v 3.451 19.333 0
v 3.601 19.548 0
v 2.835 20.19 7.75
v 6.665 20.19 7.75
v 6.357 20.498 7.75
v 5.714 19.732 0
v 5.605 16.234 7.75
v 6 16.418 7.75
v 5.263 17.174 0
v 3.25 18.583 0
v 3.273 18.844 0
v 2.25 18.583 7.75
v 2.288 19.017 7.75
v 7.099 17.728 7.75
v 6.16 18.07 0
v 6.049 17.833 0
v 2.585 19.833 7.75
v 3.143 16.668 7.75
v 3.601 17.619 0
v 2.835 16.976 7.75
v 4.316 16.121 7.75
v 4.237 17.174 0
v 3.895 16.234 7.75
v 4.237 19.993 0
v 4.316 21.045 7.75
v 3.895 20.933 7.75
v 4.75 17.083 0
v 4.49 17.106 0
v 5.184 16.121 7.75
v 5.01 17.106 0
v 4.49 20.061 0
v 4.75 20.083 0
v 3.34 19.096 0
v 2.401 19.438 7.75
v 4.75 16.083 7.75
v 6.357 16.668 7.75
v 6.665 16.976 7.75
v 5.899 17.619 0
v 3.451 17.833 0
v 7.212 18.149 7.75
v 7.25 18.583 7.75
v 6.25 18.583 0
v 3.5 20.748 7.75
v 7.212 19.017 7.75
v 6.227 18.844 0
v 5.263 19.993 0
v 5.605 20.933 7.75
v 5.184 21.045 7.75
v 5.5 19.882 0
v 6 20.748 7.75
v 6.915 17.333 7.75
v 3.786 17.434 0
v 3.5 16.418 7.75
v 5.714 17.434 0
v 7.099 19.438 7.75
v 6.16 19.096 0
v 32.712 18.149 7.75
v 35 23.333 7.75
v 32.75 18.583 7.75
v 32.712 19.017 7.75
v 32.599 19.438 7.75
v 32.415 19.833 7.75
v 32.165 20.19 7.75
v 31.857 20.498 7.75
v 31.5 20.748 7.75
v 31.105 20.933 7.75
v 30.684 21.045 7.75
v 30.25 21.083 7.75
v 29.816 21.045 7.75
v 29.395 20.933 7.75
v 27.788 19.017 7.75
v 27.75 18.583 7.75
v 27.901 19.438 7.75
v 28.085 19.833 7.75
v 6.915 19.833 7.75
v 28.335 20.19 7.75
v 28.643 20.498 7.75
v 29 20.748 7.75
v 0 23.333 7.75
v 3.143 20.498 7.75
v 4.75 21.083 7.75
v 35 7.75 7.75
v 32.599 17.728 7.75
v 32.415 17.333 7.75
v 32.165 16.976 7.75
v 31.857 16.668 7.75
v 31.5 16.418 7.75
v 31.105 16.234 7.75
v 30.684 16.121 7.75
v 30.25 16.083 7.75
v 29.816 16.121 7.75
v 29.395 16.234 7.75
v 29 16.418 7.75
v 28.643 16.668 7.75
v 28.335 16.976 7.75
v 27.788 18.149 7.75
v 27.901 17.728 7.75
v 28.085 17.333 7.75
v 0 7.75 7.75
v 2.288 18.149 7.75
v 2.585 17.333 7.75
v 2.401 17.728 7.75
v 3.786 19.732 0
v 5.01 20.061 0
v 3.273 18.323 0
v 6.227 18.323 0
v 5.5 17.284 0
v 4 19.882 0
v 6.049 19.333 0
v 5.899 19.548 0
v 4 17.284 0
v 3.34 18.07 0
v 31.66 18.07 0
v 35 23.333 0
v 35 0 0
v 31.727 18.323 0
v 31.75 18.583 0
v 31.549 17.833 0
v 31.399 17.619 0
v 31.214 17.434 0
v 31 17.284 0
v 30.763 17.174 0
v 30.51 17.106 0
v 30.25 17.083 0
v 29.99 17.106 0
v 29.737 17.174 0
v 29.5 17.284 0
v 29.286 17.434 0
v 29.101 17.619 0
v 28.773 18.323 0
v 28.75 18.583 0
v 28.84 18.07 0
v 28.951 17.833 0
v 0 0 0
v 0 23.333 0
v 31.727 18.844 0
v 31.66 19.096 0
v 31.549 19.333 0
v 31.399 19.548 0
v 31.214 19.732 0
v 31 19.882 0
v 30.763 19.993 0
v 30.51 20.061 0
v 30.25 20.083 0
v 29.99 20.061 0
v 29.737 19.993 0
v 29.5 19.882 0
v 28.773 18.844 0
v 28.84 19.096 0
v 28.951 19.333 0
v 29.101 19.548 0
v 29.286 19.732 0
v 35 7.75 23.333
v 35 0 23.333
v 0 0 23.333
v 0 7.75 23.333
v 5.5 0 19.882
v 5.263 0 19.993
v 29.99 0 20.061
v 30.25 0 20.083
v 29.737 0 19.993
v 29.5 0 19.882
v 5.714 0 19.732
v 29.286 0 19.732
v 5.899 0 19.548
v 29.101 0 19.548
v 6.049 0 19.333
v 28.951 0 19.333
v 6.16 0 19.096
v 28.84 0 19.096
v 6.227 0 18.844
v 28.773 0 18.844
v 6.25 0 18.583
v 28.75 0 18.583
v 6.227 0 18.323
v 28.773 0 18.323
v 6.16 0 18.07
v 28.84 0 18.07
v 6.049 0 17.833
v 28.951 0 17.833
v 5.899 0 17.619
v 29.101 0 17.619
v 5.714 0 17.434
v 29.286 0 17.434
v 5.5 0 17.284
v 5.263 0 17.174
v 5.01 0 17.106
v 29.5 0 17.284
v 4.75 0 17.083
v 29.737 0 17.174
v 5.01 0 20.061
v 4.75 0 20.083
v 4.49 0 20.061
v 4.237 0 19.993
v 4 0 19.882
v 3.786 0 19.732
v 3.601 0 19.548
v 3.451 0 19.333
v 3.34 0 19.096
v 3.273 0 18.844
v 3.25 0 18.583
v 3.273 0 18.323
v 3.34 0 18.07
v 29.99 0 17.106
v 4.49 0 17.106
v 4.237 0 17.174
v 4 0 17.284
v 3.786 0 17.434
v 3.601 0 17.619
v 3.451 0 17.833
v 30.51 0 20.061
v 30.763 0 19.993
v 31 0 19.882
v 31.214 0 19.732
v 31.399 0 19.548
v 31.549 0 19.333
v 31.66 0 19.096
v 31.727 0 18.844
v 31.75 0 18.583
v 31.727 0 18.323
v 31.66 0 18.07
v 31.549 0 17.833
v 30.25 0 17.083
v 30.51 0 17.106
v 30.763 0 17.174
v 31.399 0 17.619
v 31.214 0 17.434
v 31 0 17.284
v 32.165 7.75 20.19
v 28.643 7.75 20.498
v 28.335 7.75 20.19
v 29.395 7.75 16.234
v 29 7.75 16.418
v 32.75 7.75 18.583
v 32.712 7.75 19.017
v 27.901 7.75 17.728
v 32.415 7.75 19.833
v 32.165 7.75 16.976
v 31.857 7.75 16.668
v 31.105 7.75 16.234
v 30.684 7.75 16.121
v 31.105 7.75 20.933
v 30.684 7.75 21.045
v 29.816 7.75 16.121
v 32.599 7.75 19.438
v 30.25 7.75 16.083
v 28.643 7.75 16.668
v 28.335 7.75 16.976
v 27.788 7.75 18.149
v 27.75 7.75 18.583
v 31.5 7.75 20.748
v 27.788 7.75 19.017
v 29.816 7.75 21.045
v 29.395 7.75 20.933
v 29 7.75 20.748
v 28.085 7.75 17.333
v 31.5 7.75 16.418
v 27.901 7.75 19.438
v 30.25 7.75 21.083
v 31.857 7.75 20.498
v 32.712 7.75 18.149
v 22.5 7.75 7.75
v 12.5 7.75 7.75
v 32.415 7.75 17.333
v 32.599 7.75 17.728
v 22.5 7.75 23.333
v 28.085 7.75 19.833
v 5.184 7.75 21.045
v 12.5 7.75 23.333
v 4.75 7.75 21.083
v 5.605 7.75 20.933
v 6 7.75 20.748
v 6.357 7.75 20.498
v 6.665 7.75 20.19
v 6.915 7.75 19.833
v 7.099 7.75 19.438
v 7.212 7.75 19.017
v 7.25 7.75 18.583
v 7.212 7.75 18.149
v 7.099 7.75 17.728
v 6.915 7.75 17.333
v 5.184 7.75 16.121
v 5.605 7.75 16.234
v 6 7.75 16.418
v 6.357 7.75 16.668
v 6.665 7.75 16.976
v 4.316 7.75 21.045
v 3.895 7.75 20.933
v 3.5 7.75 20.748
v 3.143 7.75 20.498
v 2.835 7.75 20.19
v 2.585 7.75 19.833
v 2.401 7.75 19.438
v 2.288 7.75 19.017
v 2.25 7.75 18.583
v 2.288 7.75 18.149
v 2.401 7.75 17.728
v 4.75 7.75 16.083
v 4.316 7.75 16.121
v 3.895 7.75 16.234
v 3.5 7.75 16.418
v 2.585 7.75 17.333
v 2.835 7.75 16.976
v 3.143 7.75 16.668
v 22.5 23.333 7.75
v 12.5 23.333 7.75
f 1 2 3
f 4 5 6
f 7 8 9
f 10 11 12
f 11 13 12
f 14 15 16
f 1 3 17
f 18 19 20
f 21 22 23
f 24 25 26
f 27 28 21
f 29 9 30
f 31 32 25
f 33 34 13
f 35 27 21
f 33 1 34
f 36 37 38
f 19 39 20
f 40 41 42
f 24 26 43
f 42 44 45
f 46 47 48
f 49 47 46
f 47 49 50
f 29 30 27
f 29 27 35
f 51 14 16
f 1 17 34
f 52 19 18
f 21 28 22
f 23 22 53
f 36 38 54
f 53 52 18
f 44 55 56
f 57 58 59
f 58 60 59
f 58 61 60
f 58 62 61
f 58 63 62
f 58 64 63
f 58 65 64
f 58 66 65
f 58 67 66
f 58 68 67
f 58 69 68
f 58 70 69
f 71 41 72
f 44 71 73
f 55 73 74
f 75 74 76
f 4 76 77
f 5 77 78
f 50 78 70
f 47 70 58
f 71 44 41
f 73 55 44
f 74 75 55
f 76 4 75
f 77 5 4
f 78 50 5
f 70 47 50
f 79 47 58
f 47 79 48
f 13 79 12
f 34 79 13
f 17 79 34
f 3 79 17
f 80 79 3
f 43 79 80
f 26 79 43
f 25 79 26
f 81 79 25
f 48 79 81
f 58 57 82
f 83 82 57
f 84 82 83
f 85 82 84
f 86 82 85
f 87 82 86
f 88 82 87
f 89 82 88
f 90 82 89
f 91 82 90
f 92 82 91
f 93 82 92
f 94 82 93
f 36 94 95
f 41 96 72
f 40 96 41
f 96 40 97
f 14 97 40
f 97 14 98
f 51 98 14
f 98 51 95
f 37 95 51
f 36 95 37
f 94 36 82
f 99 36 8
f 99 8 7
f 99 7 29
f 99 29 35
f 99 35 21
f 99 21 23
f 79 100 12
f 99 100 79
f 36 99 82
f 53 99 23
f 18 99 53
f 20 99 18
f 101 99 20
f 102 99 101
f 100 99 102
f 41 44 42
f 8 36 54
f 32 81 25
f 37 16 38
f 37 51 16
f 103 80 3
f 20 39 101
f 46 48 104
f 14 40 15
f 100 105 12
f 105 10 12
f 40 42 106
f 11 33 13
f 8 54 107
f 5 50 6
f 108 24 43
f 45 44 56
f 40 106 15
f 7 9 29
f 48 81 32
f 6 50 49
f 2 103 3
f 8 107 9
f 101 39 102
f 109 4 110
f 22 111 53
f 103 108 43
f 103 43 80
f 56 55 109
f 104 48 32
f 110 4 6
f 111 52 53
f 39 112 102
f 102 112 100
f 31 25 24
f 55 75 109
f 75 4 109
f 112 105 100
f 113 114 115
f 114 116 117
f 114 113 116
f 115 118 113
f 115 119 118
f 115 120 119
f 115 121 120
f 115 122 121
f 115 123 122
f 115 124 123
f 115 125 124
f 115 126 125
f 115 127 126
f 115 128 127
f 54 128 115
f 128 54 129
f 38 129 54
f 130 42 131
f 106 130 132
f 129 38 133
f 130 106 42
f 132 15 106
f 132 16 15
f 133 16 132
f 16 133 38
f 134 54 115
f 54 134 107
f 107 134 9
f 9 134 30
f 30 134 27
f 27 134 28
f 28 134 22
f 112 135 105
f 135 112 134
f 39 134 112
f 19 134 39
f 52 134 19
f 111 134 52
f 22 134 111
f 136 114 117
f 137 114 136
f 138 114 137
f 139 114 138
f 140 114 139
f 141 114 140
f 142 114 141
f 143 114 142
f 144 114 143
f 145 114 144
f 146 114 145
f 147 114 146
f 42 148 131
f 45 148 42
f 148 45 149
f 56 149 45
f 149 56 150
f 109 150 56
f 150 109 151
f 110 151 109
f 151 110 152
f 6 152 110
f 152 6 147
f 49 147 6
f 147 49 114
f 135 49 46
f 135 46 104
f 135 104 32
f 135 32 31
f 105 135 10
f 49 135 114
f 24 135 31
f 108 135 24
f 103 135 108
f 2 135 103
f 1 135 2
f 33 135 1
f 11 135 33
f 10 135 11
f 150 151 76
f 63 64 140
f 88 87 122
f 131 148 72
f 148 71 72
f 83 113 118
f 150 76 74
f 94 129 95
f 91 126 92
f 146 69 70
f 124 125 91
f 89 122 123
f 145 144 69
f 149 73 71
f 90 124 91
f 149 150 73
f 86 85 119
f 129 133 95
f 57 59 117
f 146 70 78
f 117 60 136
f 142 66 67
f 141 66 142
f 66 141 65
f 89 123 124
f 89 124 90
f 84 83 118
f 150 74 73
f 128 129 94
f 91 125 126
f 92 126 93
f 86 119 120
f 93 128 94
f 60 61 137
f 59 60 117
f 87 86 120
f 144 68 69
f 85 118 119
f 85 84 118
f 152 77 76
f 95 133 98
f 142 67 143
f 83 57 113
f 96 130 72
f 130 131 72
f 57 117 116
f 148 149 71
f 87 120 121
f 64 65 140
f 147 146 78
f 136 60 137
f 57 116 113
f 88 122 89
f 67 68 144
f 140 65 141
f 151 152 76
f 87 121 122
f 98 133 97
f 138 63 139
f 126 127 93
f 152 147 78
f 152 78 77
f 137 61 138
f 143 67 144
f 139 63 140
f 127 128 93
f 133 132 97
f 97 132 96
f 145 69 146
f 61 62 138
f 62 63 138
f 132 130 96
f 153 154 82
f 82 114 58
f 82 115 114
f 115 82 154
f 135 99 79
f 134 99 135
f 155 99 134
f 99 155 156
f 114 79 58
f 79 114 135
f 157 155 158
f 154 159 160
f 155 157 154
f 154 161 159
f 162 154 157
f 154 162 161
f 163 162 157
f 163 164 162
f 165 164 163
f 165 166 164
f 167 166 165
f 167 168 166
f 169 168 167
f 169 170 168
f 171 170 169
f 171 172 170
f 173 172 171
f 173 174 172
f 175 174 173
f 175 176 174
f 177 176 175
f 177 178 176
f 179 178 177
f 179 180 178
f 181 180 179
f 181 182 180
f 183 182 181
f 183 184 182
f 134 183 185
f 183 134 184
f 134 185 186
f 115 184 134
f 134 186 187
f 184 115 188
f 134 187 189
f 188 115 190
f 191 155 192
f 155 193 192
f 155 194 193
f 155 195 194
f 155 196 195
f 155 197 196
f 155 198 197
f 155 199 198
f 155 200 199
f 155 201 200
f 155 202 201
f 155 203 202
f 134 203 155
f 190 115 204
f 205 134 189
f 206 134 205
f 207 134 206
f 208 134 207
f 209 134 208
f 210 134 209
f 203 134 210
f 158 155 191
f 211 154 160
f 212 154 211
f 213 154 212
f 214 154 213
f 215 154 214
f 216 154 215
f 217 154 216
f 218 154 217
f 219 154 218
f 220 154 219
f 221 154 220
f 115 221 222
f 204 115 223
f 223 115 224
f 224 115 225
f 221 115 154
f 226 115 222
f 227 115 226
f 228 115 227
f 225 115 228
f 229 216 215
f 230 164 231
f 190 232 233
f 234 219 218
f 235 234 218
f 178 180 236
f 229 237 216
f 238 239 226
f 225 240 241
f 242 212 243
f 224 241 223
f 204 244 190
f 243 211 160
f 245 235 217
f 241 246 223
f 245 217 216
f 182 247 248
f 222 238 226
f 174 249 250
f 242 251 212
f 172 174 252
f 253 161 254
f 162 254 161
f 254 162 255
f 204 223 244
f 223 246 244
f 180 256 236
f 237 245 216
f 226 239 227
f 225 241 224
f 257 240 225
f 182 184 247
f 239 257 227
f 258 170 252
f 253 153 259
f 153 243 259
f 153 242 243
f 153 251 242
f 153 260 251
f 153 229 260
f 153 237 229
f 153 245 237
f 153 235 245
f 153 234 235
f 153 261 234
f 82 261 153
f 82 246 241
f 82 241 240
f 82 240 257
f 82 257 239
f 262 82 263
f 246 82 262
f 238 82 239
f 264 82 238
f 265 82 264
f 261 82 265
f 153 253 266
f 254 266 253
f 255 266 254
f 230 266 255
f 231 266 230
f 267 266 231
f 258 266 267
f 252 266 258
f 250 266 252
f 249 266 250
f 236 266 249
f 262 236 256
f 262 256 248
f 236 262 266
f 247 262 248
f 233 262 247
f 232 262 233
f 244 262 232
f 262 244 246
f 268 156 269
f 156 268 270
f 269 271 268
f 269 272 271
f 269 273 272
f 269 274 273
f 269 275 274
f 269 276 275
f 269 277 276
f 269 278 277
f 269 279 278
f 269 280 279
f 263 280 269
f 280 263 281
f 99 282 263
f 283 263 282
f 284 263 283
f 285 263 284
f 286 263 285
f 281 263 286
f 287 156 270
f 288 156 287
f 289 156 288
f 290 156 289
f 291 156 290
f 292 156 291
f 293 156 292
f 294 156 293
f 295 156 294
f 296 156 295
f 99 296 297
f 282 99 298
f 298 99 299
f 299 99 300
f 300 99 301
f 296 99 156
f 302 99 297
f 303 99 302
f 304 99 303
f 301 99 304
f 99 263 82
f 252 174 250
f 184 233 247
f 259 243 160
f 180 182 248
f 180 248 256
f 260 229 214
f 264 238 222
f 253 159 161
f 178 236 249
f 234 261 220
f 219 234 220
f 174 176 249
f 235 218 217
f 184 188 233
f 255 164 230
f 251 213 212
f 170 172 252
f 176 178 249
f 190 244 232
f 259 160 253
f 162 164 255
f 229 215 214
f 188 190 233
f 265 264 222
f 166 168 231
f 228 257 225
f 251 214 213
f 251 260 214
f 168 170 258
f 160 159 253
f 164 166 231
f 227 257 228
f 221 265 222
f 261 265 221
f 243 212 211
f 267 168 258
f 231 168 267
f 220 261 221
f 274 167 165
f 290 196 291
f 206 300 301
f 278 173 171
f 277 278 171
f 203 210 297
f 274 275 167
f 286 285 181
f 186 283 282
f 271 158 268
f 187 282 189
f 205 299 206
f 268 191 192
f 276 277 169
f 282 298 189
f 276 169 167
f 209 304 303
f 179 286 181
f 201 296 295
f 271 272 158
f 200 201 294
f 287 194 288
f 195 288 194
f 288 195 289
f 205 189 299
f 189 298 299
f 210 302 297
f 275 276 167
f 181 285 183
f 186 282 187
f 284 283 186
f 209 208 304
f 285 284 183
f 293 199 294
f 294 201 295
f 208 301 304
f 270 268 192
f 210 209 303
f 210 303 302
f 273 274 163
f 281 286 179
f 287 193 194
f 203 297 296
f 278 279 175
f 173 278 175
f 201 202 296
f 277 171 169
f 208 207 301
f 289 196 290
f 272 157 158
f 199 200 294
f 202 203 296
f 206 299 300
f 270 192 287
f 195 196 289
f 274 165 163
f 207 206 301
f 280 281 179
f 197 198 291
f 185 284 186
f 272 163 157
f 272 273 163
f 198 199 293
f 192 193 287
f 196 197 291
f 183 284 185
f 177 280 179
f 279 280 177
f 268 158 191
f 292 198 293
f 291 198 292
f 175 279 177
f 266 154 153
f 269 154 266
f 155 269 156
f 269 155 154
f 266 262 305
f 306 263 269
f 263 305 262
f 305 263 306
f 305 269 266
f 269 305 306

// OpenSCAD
$fn=36;

ls=12.5;
s1=5;
s2=3;
db=9.5;

gs=35;
gs2=gs/1.5;

d=ls-(db/2);

module platte()
{
cube([gs,gs2,d]);
}

module schraube()
{
translate([0,0,d])
color("blue")
rotate([0,180,0])
cylinder(h=d, d1=s1, d2=s2);
}
//sx=s1;
sx=db/2;
module schrauben()
{
    //translate([sx,sx+d*2,0])
    //schraube();
    
    //translate([gs-sx,sx+d*2,0])
    //schraube();
    
    translate([sx,gs2-sx,0])
    schraube();
    
    translate([gs-sx,gs2-sx,0])
    schraube();
}

module plattes()
{
difference()
{
    platte();
    schrauben();
}
}


module platte2()
{
    translate([gs,0,0])
rotate([90,0,180])
    plattes();
}

plattes();
platte2();

tw=10;
txy=gs2-d;
//rotate([0,90,180])
module t()
{

rotate([180,90,0])
linear_extrude(tw)
triangle(a=txy,b=txy,c_angle=90);
}

translate([gs/2+tw/2,d,txy+d])
rotate([45,0,0])
t();

// Creates a 2D triangle with the given sides and/or angles.
// Any three parameters can be used to describe the triangle, e.g.
// a=3,b=4,c=5; a=3,b=4,c_angle=90; and a=3,b_angle=53.13,c_angle=90
// all describe the same triangle.
// Side c runs along the x axis, with side a leaving the origin at a_angle.
// Reference: https://www.calculator.net/triangle-calculator.html
module triangle(a=0,b=0,c=0,a_angle=0,b_angle=0,c_angle=0) {
    assert(a_angle==a_angle && b_angle==b_angle && c_angle==c_angle,
           "Invalid triangle: impossible angles");
        
    // returns c
    function shared_angle(a, b, c_angle) = sqrt(pow(b,2)+pow(a,2)-2*b*a*cos(c_angle));

    // returns c_angle
    function opposing_angle(a, a_angle, b) = asin(b*sin(a_angle)/a);

    // returns angles A, B, C if they sum to 180
    // if one angle is unset (0) it will be set to the difference of the other two
    function triangle_angles(a, b, c) =
      let (
        a = a > 0 ? a : assert(b!=0 && c!=0, "Insufficient angles") 180 - b - c,
        b = b > 0 ? b : assert(a!=0 && c!=0, "Insufficient angles") 180 - a - c,
        c = c > 0 ? c : assert(a!=0 && b!=0, "Insufficient angles") 180 - a - b
      )
      assert(a + b + c == 180, "Invalid triangle: impossible angles")
      [a,b,c];

    // returns b
    function angle_ratio(a, angle_a, angle_b) = a*sin(angle_b)/sin(angle_a);

    // Three Sides
    if (a>0 && b>0 && c>0) {
        assert(a_angle==0 && b_angle==0 && c_angle==0, "Too many arguments");
        let ( a_angle = acos((pow(b,2)+pow(c,2)-pow(a,2))/(2*b*c)) ) {
            assert(a_angle==a_angle, "Invalid triangle: impossible lengths");
            assert(sin(a_angle)!= 0, "Invalid triangle: colinear");
            polygon(points = [[0, 0], [c, 0], [b * cos(a_angle), b * sin(a_angle)]]);
        }
    // Shared Angle
    } else if (a>0 && b>0 && c_angle>0) {
        assert(c==0 && a_angle==0 && b_angle==0, "Too many arguments");
        triangle(a,b,shared_angle(a,b,c_angle));
    } else if (a>0 && c>0 && b_angle>0) {
        assert(b==0 && a_angle==0 && c_angle==0, "Too many arguments");
        triangle(a,shared_angle(a,c,b_angle),c);
    } else if (b>0 && c>0 && a_angle>0) {
        assert(a==0 && b_angle==0 && c_angle==0, "Too many arguments");
        triangle(shared_angle(b,c,a_angle),b,c);
    // Opposing Angle
    } else if (a>0 && a_angle>0 && b>0) {
        assert(c==0 && c_angle==0 && b_angle==0, "Too many arguments");
        triangle(a=a,b=b,c_angle=opposing_angle(a,a_angle,b));
    } else if (a>0 && a_angle>0 && c>0) {
        assert(b==0 && b_angle==0 && c_angle==0, "Too many arguments");
        triangle(a=a,c=c,b_angle=opposing_angle(a,a_angle,c));
    } else if (b>0 && b_angle>0 && a>0) {
        assert(c==0 && c_angle==0 && a_angle==0, "Too many arguments");
        triangle(a=a,b=b,c_angle=opposing_angle(b,b_angle,a));
    } else if (b>0 && b_angle>0 && c>0) {
        assert(a==0 && a_angle==0 && c_angle==0, "Too many arguments");
        triangle(a=a,c=c,a_angle=opposing_angle(b,b_angle,c));
    } else if (c>0 && c_angle>0 && a>0) {
        assert(b==0 && b_angle==0 && a_angle==0, "Too many arguments");
        triangle(a=a,c=c,b_angle=opposing_angle(c,c_angle,a));
    } else if (c>0 && c_angle>0 && b>0) {
        assert(a == 0 && a_angle == 0 && b_angle == 0, "Too many arguments");
        triangle(b = b, c = c, a_angle = opposing_angle(c, c_angle, b));
    // Two+ Angles
    } else if (a>0 && b==0 && c==0) {
        angles = triangle_angles(a_angle, b_angle, c_angle);
        triangle(a=a, b=angle_ratio(a,angles[0],angles[1]), c=angle_ratio(a,angles[0],angles[2]));
    } else if (b>0 && a==0 && c==0) {
        angles = triangle_angles(a_angle, b_angle, c_angle);
        triangle(a=angle_ratio(b,angles[1],angles[0]), b=b, c=angle_ratio(b,angles[1],angles[2]));
    } else if (c>0 && a==0 && b==0) {
        angles = triangle_angles(a_angle, b_angle, c_angle);
        triangle(a=angle_ratio(c,angles[2],angles[0]), b=angle_ratio(c,angles[2],angles[1]), c=c);
    } else {
        assert(false, "Insufficient arguments");
    }
}
